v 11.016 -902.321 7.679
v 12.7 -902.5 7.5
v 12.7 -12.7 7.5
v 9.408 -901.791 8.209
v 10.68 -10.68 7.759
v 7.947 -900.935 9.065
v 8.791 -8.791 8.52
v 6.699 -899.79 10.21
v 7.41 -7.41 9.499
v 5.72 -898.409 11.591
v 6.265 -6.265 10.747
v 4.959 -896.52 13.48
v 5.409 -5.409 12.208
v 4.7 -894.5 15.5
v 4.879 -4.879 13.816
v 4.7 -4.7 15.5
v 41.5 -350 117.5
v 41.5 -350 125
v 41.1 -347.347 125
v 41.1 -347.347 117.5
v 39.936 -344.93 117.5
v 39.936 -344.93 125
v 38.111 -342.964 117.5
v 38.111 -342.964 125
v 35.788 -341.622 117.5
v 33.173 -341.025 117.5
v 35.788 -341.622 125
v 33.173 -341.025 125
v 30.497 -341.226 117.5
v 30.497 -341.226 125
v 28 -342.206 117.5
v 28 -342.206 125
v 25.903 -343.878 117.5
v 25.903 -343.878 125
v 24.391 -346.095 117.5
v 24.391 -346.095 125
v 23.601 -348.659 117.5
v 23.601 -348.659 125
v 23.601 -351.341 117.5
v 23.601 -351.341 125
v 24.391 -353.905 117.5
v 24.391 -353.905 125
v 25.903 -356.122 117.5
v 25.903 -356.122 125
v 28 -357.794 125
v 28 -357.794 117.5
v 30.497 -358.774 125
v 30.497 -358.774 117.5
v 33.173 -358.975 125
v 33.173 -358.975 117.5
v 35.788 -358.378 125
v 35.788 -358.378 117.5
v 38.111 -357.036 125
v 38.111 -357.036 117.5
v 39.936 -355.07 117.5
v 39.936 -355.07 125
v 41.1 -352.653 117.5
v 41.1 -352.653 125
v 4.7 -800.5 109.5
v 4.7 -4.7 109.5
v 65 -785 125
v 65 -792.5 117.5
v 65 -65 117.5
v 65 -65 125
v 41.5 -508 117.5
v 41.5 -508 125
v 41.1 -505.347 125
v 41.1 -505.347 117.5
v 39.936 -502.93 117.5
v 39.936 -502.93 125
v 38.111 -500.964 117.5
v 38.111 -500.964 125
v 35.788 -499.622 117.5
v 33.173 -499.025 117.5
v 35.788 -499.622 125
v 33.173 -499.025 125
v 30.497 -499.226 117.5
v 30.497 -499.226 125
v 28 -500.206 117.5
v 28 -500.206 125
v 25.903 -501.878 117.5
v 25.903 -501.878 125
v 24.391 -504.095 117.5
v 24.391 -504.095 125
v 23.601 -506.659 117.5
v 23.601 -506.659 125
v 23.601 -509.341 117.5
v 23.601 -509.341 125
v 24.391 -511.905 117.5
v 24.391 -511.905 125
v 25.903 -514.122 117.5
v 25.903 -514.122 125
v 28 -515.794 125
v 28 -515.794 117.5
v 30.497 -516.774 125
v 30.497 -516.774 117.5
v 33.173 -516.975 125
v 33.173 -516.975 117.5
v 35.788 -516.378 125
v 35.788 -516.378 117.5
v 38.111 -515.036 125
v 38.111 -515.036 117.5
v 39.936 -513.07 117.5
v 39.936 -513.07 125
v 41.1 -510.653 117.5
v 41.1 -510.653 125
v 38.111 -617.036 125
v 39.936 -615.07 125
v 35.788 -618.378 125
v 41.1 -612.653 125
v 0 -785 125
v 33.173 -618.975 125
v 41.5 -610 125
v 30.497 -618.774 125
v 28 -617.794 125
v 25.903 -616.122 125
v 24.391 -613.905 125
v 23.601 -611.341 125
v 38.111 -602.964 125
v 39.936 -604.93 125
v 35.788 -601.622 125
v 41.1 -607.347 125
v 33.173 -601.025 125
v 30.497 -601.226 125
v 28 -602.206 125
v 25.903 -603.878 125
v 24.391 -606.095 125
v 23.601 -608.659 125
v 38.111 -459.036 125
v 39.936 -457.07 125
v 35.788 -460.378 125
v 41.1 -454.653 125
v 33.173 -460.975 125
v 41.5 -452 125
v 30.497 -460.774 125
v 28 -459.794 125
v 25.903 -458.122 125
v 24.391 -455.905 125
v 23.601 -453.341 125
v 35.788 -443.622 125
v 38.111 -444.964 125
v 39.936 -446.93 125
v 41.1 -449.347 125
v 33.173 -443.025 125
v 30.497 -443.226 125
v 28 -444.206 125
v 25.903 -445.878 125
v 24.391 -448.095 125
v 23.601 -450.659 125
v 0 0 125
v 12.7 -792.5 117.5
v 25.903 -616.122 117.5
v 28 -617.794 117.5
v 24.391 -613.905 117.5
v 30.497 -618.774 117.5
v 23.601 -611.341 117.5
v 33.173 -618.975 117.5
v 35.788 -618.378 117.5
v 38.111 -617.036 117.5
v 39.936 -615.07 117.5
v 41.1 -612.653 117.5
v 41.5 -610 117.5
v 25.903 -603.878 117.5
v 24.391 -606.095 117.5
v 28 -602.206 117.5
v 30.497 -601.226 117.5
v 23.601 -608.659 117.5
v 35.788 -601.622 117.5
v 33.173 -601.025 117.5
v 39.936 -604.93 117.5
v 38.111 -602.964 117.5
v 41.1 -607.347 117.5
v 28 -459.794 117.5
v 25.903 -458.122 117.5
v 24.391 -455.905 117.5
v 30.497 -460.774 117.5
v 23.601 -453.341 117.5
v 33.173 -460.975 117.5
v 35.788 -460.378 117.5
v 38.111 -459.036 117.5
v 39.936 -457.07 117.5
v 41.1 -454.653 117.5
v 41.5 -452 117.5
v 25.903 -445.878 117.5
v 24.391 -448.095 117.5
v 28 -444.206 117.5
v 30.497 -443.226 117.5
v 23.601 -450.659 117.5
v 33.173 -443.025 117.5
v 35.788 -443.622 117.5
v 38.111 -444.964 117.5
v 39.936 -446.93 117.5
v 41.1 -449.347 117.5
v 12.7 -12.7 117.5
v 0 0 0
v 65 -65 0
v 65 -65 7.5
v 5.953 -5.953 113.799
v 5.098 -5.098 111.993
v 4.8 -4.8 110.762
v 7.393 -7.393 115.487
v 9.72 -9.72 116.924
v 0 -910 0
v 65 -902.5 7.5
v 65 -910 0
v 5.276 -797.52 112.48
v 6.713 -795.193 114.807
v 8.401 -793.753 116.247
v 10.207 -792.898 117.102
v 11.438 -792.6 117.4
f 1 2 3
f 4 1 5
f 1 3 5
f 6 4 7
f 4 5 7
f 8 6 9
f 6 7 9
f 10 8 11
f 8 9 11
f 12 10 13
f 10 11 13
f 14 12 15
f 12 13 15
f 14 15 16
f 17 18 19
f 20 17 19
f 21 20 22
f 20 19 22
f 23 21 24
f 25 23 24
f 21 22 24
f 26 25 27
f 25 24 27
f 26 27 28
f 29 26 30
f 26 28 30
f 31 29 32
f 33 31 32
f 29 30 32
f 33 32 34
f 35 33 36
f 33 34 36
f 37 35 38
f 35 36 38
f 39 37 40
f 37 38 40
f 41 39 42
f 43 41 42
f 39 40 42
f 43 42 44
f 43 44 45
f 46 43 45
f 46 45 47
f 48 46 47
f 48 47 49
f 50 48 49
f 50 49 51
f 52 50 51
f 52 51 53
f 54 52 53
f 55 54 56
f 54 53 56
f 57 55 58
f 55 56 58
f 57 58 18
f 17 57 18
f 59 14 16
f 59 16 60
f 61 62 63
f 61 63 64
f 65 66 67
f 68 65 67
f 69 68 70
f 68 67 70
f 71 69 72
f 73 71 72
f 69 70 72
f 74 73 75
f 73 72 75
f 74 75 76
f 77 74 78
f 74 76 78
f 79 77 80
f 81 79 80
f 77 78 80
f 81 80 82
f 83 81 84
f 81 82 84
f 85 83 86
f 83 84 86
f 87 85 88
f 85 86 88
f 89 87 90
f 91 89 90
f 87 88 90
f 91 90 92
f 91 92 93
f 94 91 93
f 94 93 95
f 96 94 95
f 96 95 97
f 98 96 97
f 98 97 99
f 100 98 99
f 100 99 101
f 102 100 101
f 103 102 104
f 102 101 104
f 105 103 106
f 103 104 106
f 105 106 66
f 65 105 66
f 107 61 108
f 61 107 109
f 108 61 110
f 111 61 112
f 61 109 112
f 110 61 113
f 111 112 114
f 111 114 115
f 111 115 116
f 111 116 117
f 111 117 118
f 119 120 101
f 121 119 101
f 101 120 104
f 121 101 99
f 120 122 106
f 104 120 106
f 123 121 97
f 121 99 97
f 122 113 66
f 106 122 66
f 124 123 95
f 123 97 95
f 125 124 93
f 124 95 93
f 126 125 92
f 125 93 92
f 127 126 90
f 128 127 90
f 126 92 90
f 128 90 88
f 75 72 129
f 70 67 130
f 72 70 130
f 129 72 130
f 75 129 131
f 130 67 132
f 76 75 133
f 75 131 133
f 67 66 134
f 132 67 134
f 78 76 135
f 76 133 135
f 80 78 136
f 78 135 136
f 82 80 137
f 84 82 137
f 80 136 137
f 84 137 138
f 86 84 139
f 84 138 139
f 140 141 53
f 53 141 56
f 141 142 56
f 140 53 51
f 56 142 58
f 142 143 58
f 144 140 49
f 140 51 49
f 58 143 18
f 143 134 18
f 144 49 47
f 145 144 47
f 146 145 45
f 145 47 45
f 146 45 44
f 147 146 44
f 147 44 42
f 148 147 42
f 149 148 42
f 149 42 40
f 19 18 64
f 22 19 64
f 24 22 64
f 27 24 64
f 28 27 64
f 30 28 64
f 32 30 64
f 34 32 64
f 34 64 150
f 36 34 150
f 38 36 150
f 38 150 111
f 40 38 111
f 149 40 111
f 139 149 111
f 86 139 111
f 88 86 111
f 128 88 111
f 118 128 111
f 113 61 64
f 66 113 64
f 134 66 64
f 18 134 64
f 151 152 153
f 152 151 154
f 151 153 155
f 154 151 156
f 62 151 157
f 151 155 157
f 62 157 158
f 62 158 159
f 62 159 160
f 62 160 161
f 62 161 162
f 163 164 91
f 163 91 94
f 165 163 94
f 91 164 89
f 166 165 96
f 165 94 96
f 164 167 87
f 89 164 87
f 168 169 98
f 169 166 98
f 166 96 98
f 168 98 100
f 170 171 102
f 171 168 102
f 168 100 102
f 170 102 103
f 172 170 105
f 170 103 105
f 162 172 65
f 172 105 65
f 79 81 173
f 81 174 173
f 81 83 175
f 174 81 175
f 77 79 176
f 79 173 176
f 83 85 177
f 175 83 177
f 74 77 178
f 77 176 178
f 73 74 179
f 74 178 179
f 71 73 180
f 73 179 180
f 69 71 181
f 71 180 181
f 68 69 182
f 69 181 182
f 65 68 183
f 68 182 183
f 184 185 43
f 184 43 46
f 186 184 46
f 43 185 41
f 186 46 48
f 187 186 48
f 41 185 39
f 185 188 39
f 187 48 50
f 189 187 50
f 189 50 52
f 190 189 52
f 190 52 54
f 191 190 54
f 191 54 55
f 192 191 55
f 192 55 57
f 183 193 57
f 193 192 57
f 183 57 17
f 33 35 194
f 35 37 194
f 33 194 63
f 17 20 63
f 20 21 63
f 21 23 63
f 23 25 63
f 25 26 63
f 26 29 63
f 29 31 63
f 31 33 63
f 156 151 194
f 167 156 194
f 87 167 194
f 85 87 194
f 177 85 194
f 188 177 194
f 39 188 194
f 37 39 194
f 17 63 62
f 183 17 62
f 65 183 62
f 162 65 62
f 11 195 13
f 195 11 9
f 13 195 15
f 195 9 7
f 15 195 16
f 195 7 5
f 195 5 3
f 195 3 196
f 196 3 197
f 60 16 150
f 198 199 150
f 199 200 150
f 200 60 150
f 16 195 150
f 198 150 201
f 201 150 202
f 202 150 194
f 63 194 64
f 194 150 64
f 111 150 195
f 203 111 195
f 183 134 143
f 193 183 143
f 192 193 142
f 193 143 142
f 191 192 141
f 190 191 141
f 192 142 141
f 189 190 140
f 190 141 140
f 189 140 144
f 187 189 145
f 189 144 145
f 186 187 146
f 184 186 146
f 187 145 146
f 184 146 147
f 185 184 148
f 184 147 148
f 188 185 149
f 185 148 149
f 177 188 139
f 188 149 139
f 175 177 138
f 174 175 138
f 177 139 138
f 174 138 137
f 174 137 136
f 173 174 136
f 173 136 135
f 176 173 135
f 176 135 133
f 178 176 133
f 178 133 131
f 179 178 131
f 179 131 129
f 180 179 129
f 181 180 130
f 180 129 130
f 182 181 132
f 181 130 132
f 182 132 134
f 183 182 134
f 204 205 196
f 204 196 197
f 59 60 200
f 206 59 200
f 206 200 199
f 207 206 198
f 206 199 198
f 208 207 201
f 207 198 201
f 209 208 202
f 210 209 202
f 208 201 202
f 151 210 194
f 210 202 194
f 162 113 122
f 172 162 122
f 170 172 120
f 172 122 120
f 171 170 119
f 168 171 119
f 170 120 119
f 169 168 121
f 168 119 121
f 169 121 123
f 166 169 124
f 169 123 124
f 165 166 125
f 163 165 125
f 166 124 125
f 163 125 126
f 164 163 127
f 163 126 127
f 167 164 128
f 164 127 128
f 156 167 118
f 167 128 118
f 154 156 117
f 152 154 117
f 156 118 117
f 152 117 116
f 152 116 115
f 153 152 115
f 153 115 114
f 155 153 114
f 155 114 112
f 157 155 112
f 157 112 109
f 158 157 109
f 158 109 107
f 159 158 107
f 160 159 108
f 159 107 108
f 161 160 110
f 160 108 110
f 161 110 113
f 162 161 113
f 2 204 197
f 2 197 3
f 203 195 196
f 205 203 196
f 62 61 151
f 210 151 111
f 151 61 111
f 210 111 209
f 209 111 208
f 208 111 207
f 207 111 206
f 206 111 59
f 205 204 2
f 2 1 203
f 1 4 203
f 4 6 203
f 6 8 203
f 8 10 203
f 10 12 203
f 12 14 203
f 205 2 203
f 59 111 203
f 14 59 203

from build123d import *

# Parameters (mm, degrees)
F1_DEPTH = 910
F3_DEPTH = 125.001
F5_DEPTH = 65.001
F6_R     = 9
F7_DEPTH = 7.5
F8_R     = 9
F9_DEPTH = 7.5


with BuildPart() as f1:
    # F0 (on Front) → F1 (new body)
    with BuildSketch(Plane.XZ):
        with BuildLine():
            Line((0, 125), (0, 0))
            Line((0, 0), (65, 0))
            Line((65, 0), (65, 7.5))
            Line((65, 7.5), (12.7, 7.5))
            ThreePointArc((12.7, 7.5), (7.043146, 9.843146), (4.7, 15.5))
            Line((4.7, 15.5), (4.7, 109.5))
            ThreePointArc((4.7, 109.5), (7.043146, 115.156854), (12.7, 117.5))
            Line((12.7, 117.5), (65, 117.5))
            Line((65, 117.5), (65, 125))
            Line((65, 125), (0, 125))
        make_face()
    extrude(amount=F1_DEPTH)

    # F2 (on face) → F3 (cut, through all)
    with BuildSketch(Plane.XY.offset(125)):
        Polygon((65, -65), (65, 0), (0, 0), align=None)
    extrude(amount=-F3_DEPTH, mode=Mode.SUBTRACT)

    # F4 (on face) → F5 (cut, through all)
    with BuildSketch(Plane(origin=(0, 0, 0), x_dir=(0, -1, 0), z_dir=(-1, 0, 0))):
        Polygon((910, 0), (910, 125), (785, 125), align=None)
    extrude(amount=-F5_DEPTH, mode=Mode.SUBTRACT)

    # F6 (on face) → F7 (cut, through all)
    with BuildSketch(Plane.XY.offset(125)):
        with Locations((32.5, -350)):
            Circle(F6_R)
        with Locations((32.5, -452)):
            Circle(F6_R)
    extrude(amount=-F7_DEPTH, mode=Mode.SUBTRACT)

    # F8 (on face) → F9 (cut, through all)
    with BuildSketch(Plane.XY.offset(125)):
        with Locations((32.5, -508)):
            Circle(F8_R)
        with Locations((32.5, -610)):
            Circle(F8_R)
    extrude(amount=-F9_DEPTH, mode=Mode.SUBTRACT)


solid = f1.part
